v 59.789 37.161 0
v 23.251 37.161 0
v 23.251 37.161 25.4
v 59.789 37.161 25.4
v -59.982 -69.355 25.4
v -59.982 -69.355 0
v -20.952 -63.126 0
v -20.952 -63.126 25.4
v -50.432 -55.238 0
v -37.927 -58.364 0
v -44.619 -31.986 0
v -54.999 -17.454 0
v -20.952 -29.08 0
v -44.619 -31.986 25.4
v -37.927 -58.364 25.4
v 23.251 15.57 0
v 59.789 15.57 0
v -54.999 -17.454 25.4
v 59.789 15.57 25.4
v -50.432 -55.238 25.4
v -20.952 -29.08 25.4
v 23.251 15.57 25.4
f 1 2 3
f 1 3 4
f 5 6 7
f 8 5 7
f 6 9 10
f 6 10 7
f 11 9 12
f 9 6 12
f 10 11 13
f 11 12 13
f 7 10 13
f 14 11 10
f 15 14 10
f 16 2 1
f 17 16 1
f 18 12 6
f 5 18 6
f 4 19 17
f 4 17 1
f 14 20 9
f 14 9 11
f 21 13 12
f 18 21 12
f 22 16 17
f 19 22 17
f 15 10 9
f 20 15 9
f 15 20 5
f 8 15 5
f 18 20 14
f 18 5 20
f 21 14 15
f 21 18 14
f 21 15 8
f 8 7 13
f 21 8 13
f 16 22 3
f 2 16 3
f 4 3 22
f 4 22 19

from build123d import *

# Parameters (mm, degrees)
F1_DEPTH = 25.4
F0_W     = 36.537992
F0_H     = 21.590633
F2_DEPTH = 25.4


with BuildPart() as f1:
    # F0 (on Top) → F1 (new body)
    with BuildSketch(Plane.XY):
        Polygon((-20.952431, -29.079724), (-54.999199, -17.453996), (-59.981655, -69.354557), (-20.952431, -63.12649), align=None)
        Polygon((-50.431952, -55.237599), (-44.619087, -31.986151), (-37.92697, -58.363846), align=None, mode=Mode.SUBTRACT)
    extrude(amount=F1_DEPTH)


with BuildPart() as f2:
    # F0 (on Top) → F2 (new body)
    with BuildSketch(Plane.XY):
        with Locations((41.520446, 26.365479)):
            Rectangle(F0_W, F0_H)
    extrude(amount=F2_DEPTH)


solid = Compound([f1.part, f2.part])
